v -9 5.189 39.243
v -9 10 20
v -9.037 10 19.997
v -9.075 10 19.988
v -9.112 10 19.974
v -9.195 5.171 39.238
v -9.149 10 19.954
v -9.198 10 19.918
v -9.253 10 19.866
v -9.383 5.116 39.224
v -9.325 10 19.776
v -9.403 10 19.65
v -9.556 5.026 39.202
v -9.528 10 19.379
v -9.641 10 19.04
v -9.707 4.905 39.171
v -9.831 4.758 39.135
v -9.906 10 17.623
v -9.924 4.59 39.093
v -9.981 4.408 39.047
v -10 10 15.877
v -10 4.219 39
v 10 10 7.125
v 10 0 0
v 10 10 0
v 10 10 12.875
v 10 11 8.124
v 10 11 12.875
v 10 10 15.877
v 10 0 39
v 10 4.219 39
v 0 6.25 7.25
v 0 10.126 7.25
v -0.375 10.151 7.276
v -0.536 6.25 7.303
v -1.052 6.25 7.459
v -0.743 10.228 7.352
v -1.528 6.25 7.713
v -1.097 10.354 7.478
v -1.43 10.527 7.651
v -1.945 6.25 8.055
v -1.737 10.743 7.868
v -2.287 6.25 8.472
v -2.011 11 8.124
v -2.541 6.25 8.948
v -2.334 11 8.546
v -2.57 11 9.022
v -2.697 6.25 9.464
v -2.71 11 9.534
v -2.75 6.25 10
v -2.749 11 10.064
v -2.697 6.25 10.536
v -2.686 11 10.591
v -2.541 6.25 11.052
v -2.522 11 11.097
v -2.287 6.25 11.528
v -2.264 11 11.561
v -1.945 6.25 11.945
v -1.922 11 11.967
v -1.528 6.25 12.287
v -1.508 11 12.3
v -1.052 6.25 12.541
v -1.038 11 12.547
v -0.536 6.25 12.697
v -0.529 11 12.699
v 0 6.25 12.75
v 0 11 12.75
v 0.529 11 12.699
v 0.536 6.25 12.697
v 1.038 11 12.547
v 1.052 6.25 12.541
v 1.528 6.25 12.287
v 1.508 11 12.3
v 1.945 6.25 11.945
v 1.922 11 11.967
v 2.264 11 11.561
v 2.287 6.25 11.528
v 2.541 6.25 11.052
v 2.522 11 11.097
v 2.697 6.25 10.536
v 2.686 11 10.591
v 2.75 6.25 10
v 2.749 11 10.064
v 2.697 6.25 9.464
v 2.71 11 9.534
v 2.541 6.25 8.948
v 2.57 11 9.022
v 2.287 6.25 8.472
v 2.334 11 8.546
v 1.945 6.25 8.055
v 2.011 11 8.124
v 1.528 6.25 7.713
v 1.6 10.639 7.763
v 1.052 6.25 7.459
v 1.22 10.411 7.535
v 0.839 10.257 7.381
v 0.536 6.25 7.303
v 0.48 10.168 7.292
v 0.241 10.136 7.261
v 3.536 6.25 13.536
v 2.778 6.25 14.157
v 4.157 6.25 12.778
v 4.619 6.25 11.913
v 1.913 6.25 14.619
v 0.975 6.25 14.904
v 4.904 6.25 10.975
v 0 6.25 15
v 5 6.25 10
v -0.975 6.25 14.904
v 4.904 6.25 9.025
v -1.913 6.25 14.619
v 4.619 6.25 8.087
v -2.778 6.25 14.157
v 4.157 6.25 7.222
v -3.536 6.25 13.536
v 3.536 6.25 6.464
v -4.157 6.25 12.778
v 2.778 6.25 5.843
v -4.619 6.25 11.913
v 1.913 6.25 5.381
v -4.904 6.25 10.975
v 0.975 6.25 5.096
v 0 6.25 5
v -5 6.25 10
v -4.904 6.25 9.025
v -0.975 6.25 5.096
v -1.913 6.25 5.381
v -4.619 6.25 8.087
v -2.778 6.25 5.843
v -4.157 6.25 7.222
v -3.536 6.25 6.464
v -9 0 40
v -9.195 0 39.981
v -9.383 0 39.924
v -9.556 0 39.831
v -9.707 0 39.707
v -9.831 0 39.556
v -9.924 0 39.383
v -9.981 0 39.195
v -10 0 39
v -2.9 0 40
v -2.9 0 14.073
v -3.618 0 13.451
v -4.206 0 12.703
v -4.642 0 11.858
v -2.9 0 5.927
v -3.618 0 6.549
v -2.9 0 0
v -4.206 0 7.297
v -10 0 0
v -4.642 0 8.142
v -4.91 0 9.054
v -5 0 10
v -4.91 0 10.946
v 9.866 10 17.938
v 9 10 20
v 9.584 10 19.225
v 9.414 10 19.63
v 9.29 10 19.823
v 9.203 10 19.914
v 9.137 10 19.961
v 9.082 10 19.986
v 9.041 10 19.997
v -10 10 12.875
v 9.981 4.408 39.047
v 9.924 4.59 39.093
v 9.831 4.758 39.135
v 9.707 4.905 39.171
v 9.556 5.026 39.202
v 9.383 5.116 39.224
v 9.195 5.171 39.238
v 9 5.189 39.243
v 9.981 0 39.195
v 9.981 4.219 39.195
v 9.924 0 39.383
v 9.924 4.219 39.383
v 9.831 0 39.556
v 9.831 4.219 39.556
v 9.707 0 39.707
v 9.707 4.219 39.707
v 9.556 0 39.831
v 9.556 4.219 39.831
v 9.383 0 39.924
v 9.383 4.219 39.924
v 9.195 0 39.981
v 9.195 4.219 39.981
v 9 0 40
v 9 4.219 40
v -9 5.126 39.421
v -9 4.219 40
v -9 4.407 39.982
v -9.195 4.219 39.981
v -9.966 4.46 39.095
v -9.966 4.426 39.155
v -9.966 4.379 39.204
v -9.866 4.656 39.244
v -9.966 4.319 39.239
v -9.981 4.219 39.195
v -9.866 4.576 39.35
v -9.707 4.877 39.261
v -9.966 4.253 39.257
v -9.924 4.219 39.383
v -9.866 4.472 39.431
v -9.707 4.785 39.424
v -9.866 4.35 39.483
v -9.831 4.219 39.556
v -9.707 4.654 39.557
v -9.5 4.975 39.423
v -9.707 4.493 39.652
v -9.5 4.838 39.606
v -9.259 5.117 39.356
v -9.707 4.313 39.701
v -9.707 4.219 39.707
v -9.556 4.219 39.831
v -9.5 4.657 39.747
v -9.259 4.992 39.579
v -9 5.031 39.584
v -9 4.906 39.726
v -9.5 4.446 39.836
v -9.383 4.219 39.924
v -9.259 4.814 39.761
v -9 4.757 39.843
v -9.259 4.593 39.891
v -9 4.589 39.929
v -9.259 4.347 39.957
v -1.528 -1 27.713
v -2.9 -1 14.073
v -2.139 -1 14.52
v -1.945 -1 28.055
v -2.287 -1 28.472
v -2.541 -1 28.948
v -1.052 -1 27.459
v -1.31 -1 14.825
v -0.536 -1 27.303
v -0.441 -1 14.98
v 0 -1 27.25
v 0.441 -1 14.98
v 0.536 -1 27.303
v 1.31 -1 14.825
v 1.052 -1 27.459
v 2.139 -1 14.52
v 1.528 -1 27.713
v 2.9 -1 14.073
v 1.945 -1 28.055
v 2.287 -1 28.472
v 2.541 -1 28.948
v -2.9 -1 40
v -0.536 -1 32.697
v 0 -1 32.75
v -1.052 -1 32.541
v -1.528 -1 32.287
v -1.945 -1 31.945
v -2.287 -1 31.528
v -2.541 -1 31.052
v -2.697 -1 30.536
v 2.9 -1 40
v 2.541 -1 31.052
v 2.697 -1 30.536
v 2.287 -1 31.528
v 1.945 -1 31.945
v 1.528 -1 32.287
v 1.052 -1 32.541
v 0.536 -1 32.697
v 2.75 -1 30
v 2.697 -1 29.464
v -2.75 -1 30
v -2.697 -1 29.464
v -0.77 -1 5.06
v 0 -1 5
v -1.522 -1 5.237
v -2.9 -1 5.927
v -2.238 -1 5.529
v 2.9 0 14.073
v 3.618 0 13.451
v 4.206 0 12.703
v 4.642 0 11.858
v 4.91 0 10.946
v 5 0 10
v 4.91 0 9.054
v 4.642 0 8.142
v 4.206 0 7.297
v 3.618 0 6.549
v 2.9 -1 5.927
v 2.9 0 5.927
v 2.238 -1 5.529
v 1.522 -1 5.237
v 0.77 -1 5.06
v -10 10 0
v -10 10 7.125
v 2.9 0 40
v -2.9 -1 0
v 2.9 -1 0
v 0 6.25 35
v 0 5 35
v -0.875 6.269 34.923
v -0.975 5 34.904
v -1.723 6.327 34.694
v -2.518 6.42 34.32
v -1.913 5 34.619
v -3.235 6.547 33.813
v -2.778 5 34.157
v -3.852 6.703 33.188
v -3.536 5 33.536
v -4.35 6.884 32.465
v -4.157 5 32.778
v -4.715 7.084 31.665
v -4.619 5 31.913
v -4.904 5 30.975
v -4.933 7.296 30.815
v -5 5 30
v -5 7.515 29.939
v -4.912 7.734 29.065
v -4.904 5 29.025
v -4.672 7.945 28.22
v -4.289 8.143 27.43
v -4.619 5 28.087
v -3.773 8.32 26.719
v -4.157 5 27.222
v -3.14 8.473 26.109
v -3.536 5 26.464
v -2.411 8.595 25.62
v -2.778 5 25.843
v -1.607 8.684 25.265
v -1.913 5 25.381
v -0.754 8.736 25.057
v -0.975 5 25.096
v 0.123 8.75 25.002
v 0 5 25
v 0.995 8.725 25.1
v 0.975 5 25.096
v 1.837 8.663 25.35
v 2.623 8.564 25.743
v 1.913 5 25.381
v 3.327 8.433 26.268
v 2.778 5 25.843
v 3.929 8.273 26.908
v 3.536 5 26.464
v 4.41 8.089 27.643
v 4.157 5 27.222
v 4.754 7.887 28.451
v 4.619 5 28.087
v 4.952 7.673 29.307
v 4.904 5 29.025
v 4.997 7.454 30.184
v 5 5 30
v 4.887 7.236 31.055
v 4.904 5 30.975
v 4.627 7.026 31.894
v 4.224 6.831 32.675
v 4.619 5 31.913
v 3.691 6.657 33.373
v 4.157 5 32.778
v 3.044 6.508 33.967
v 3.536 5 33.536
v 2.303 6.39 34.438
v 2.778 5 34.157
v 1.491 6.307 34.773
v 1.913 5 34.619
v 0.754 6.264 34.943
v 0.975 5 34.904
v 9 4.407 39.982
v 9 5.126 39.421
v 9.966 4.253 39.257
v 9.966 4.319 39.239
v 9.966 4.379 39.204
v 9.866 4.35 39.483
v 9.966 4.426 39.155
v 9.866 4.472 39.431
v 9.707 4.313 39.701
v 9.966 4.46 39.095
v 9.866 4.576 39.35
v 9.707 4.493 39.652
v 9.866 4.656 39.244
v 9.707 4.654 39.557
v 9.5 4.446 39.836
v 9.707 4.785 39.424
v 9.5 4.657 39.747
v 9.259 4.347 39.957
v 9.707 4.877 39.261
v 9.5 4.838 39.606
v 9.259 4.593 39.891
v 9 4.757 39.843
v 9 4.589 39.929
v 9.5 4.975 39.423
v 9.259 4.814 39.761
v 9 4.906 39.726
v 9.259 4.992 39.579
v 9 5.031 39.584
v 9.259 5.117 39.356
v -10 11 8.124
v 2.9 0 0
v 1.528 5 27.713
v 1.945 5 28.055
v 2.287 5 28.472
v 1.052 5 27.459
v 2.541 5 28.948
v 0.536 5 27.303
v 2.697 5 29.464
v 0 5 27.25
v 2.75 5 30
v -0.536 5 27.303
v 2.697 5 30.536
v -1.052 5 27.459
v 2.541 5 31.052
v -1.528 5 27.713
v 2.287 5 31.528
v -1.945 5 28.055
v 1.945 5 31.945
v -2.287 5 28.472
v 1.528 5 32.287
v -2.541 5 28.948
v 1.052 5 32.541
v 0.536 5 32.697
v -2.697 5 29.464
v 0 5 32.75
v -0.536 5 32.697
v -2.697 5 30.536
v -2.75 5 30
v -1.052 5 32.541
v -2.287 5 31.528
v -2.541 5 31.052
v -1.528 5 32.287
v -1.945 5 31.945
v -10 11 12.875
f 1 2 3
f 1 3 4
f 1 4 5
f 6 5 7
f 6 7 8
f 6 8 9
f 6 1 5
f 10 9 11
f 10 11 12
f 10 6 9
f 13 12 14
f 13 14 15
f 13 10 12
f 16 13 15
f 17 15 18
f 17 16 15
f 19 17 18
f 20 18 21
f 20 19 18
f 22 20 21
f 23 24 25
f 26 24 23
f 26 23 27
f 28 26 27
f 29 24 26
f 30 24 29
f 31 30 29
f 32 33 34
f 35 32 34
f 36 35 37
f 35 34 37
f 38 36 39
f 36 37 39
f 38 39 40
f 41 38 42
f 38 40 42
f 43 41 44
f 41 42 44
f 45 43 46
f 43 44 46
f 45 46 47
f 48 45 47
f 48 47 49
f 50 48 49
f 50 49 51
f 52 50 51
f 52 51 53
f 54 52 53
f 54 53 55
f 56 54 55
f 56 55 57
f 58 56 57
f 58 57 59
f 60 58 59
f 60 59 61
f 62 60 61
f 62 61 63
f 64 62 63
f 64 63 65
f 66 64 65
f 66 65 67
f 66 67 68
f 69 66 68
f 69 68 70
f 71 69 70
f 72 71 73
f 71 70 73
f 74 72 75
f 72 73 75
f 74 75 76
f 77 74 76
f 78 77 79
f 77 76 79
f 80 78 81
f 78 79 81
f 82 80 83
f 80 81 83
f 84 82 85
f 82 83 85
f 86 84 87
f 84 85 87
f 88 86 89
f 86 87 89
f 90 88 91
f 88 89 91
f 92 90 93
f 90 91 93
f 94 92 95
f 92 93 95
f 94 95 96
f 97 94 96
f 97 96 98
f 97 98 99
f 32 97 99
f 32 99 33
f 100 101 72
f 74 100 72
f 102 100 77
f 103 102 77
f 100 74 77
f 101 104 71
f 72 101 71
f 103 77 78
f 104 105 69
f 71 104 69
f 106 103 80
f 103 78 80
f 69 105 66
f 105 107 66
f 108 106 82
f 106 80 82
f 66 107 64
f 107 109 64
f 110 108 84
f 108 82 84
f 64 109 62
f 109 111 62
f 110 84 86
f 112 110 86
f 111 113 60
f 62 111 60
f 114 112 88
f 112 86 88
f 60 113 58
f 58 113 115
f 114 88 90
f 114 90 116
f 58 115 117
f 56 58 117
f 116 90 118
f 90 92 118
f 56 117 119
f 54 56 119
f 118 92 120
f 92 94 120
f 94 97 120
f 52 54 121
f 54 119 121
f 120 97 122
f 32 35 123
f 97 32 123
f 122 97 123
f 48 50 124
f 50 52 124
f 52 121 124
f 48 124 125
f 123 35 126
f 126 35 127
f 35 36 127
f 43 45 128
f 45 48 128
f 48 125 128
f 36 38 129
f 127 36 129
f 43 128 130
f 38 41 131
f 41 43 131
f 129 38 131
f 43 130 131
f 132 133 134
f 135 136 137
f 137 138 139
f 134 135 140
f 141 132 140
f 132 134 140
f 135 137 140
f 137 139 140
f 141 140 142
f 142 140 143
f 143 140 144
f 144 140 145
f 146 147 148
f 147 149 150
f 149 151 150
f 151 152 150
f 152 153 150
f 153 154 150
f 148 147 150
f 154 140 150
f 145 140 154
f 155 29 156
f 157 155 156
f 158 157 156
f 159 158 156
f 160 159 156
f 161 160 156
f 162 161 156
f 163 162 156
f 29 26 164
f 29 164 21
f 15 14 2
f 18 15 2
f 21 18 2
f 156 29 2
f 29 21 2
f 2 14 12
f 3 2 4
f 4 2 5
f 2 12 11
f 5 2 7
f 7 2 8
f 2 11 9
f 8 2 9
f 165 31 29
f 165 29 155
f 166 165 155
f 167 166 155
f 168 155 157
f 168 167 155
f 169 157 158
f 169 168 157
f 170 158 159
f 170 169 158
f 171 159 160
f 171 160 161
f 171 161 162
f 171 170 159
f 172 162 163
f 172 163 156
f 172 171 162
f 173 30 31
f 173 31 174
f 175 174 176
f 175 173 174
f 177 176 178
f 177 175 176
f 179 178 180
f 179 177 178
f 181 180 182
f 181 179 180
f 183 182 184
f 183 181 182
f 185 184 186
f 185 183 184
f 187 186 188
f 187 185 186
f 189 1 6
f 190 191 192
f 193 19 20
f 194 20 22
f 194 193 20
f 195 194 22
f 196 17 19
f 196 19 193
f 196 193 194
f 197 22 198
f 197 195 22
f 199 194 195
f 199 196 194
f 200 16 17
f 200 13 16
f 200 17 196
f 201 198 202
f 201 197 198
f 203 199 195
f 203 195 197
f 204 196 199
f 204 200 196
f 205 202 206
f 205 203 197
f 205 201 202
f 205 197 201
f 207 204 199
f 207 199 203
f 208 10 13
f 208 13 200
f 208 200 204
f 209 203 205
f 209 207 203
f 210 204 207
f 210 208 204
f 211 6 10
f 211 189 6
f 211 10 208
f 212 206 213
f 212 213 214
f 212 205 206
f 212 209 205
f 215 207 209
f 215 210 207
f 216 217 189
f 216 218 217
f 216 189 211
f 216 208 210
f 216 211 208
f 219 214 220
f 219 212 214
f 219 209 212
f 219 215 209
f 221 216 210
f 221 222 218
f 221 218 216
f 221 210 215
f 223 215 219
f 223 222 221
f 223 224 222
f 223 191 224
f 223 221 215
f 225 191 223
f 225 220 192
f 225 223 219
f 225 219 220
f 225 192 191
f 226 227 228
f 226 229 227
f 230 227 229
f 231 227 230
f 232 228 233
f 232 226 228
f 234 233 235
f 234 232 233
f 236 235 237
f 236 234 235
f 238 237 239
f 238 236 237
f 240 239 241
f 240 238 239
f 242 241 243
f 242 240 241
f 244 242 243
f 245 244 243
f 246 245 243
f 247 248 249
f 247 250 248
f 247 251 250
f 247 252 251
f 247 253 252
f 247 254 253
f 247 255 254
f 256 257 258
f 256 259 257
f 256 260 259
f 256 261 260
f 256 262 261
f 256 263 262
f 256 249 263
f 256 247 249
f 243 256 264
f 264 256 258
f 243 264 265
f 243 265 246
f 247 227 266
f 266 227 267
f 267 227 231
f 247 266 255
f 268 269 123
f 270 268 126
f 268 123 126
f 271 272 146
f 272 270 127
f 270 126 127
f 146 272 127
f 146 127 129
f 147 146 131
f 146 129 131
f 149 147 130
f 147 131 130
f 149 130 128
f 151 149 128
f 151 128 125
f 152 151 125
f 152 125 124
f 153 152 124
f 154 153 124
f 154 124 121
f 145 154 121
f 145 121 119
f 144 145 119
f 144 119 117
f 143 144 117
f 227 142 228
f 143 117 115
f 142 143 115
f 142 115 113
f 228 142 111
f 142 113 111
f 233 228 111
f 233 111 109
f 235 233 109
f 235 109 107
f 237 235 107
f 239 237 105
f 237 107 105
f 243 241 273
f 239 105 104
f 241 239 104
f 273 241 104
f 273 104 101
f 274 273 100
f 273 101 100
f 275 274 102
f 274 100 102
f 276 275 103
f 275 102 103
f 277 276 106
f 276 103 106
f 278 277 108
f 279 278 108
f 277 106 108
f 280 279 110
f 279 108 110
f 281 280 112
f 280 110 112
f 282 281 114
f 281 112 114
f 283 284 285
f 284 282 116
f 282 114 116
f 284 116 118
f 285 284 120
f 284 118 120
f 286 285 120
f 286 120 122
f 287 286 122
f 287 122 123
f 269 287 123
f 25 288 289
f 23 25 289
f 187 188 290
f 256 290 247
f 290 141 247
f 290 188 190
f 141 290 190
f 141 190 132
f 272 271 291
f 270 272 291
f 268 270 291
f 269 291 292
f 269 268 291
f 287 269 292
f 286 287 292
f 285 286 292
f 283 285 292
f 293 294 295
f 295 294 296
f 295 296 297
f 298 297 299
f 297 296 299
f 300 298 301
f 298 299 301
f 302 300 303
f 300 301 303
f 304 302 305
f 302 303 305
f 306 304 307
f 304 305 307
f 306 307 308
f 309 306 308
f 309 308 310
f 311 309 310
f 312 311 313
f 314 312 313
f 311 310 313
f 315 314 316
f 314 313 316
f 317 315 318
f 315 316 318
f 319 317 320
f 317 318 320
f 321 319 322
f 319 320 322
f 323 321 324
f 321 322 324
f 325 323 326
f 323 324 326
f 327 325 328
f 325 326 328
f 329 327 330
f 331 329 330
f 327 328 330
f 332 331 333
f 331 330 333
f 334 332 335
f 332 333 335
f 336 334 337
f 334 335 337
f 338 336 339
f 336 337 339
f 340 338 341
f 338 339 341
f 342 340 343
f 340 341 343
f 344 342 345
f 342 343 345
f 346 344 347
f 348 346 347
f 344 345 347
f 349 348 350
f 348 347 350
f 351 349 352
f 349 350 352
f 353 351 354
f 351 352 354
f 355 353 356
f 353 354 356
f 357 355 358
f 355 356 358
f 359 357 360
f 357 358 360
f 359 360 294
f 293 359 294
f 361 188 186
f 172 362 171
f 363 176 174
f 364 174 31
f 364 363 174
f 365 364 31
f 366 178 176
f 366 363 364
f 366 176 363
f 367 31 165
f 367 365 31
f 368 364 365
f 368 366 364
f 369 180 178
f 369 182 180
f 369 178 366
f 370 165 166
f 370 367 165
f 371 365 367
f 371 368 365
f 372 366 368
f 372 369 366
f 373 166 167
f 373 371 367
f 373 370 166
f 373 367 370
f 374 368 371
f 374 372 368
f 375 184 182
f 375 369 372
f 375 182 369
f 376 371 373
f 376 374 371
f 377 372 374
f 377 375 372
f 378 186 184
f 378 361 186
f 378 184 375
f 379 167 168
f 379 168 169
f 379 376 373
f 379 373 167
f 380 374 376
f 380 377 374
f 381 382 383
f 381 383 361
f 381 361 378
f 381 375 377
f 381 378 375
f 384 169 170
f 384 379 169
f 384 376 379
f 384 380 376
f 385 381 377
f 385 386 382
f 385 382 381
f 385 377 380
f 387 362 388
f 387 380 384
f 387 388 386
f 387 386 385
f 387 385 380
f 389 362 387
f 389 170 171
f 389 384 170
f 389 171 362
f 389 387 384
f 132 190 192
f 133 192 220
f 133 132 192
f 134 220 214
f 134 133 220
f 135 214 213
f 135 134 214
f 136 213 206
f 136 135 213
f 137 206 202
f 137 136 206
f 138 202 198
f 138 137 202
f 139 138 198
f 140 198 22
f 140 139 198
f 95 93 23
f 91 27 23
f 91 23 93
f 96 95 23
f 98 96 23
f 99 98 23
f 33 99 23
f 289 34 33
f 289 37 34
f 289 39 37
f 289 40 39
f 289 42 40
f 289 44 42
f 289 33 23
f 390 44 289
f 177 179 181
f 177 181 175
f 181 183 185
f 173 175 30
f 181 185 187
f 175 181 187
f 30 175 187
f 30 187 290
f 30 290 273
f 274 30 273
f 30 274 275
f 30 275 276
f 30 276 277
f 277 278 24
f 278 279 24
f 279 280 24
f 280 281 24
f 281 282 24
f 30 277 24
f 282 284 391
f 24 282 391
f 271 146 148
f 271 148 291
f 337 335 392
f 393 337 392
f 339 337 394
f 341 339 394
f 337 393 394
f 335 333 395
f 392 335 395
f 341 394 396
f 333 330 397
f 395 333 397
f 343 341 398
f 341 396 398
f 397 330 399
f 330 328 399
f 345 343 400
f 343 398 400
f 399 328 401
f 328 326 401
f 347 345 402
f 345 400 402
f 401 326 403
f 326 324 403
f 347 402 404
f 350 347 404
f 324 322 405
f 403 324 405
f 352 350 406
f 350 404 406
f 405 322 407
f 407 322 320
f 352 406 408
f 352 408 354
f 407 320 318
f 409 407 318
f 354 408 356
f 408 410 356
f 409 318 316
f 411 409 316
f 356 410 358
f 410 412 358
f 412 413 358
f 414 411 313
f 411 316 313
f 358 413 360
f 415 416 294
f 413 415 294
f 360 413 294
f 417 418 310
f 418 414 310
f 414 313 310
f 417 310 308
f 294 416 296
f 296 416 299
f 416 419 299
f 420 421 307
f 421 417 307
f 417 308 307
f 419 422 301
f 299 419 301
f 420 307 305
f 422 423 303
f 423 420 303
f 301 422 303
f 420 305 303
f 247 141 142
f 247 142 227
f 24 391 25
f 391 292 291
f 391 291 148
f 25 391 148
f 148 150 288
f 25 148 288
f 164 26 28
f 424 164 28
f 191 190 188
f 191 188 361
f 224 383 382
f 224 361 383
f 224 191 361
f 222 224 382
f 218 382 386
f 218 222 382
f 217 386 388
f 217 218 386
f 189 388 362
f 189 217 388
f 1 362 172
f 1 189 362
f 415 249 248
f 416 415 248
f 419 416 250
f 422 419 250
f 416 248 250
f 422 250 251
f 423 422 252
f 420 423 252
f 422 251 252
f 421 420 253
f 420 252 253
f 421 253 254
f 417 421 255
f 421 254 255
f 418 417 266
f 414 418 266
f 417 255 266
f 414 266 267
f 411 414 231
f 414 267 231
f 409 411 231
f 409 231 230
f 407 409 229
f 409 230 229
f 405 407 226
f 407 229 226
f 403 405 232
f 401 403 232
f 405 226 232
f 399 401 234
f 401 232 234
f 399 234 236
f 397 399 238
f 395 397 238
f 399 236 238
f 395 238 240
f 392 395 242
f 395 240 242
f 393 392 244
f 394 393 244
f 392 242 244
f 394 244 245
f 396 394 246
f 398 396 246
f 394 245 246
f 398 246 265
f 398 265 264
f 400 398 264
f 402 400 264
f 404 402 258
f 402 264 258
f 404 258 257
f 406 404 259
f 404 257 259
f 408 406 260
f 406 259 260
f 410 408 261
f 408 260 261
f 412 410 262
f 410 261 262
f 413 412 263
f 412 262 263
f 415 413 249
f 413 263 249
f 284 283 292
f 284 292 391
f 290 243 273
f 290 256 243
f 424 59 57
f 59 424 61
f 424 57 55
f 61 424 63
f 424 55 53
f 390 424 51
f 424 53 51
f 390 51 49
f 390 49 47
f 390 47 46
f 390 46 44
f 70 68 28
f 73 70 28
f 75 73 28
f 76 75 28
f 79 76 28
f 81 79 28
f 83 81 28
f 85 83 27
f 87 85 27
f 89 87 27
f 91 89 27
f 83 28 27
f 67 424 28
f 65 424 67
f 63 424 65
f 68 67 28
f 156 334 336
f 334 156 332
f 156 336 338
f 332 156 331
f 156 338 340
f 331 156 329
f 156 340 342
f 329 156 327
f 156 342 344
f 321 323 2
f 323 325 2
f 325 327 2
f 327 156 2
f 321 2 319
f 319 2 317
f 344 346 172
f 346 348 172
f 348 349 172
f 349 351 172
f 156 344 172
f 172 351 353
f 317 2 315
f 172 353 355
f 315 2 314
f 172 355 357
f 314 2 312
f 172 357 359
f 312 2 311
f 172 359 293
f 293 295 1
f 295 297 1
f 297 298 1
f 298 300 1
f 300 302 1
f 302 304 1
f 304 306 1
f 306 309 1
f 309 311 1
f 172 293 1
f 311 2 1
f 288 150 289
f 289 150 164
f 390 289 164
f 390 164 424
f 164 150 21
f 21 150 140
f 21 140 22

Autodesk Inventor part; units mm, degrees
ref_plane "YZ Plane" through (0, 0, 0) normal (1, 0, 0) x (0, 1, 0)
ref_plane "XZ Plane" through (0, 0, 0) normal (0, 1, 0) x (-1, 0, 0)
ref_plane "XY Plane" through (0, 0, 0) normal (0, 0, 1) x (1, 0, 0)
sketch "Sketch1" plane through (0, 0, 0) normal (1, 0, 0) x (0, 1, 0)
  line L0 (0, 0) -> (10, 0)
  line L1 (10, 0) -> (10, 20)
  line L2 (10, 20) -> (5, 40)
  line L3 (5, 40) -> (0, 40)
  line L4 (0, 40) -> (0, 0)
  dimension "d0" = 10
  dimension "d1" = 5
  dimension "d2" = 20
  dimension "d3" = 20
extrude "Extrusion1" add sketch "Sketch1" along normal mid plane 20
sketch "Sketch2" plane through (-10, 0, 40) normal (0, 0, 1) x (1, 0, 0)
  line L0 (7.1, -1) -> (12.9, -1)
  line L1 (12.9, -1) -> (12.9, 0)
  line L2 (12.9, 0) -> (7.1, 0)
  line L3 (7.1, 0) -> (7.1, -1)
  line L4 (7.1, -1) -> (12.9, 0) construction
  line L5 (12.9, -1) -> (7.1, 0) construction
  line L6 (0, 0) -> (20, 0) projected
  point P0 (10, 0)
  point P1 (10, -0.5)
  point P2 (10, 0)
  dimension "d6" = 5.8
  dimension "d7" = 1
extrude "Extrusion2" add sketch "Sketch2" against normal up to surface (40 mm away)
sketch "Sketch5" plane through (10, 0, 0) normal (1, 0, 0) x (0, 0, -1)
  line L0 (-12.875, 11) -> (-7.125, 11)
  line L1 (-7.125, 11) -> (-7.125, 10)
  line L2 (-7.125, 10) -> (-12.875, 10)
  line L3 (-12.875, 10) -> (-12.875, 11)
  line L4 (-12.875, 11) -> (-7.125, 10) construction
  line L5 (-7.125, 11) -> (-12.875, 10) construction
  line L6 (0, 10) -> (-20, 10) projected
  point P0 (0, 0)
  point P1 (-10, 10.5)
  point P2 (-10, 10)
  dimension "d24" = 5.75
  dimension "d25" = 1
extrude "Extrusion3" add sketch "Sketch5" against normal up to surface (20 mm away)
chamfer "Chamfer1" distance 1 angle 45 1 edges at (0, 11, 7.125)
sketch "Sketch3" plane through (-10, 10, 20) normal (0, 1, 0) x (1, 0, 0)
  line L0 (0, -20) -> (20, -20) projected
  line L1 (20, 0) -> (20, -20) projected
  line L2 (0, 0) -> (20, 0) projected
  line L3 (0, -20) -> (0, 0) projected
  point P0 (10, 20)
  point P1 (10, -10)
  point P2 (10, 0)
  point P3 (0, -10)
hole "Hole1" at (0, 10, 30) direction (0, -1, 0) diameter 5.5 end through all counterbore diameter 10 counterbore depth 5 clearance for "Socket Head Cap Screw" size "M5" standard "Ansi Metric M Profile"
sketch "Sketch4" plane through (-2.9, -1, 40) normal (0, -1, 0) x (1, 0, 0)
  line L0 (-7.1, -20) -> (12.9, -20) projected
  line L1 (12.9, -40) -> (12.9, -32.875) projected
  line L2 (12.9, -40) -> (-7.1, -40) projected
  line L3 (-7.1, -20) -> (-7.1, -27.125) projected
  line L4 (-7.1, -32.875) -> (12.9, -32.875) projected
  line L5 (-7.1, -32.875) -> (-7.1, -40) projected
  line L6 (12.9, -27.125) -> (-7.1, -27.125) projected
  line L7 (12.9, -27.125) -> (12.9, -20) projected
  line L8 (-7.1, -32.875) -> (12.9, -32.875) projected
  line L9 (2.9, -32.875) -> (2.9, -27.125) construction
  line L10 (12.9, -27.125) -> (-7.1, -27.125) projected
  point P0 (2.9, -40)
  point P1 (2.9, -30)
  point P2 (-7.1, -23.5625)
  point P3 (2.9, -20)
  point P4 (2.9, -30)
hole "Hole2" at (0, -1, 10) direction (0, 1, 0) diameter 5.5 end through all counterbore diameter 10 counterbore depth 7.25 clearance for "Socket Head Cap Screw" size "M5" standard "Ansi Metric M Profile"
fillet "Fillet1" radius 1 5 edges at (0, 5, 40) (-10, 7.5, 30) (10, 7.5, 30) (10, 2.5, 40) (-10, 2.5, 40)
properties part number "Y-Axis_Extursion_Mount_LM3041" material "ABS Plastic"
